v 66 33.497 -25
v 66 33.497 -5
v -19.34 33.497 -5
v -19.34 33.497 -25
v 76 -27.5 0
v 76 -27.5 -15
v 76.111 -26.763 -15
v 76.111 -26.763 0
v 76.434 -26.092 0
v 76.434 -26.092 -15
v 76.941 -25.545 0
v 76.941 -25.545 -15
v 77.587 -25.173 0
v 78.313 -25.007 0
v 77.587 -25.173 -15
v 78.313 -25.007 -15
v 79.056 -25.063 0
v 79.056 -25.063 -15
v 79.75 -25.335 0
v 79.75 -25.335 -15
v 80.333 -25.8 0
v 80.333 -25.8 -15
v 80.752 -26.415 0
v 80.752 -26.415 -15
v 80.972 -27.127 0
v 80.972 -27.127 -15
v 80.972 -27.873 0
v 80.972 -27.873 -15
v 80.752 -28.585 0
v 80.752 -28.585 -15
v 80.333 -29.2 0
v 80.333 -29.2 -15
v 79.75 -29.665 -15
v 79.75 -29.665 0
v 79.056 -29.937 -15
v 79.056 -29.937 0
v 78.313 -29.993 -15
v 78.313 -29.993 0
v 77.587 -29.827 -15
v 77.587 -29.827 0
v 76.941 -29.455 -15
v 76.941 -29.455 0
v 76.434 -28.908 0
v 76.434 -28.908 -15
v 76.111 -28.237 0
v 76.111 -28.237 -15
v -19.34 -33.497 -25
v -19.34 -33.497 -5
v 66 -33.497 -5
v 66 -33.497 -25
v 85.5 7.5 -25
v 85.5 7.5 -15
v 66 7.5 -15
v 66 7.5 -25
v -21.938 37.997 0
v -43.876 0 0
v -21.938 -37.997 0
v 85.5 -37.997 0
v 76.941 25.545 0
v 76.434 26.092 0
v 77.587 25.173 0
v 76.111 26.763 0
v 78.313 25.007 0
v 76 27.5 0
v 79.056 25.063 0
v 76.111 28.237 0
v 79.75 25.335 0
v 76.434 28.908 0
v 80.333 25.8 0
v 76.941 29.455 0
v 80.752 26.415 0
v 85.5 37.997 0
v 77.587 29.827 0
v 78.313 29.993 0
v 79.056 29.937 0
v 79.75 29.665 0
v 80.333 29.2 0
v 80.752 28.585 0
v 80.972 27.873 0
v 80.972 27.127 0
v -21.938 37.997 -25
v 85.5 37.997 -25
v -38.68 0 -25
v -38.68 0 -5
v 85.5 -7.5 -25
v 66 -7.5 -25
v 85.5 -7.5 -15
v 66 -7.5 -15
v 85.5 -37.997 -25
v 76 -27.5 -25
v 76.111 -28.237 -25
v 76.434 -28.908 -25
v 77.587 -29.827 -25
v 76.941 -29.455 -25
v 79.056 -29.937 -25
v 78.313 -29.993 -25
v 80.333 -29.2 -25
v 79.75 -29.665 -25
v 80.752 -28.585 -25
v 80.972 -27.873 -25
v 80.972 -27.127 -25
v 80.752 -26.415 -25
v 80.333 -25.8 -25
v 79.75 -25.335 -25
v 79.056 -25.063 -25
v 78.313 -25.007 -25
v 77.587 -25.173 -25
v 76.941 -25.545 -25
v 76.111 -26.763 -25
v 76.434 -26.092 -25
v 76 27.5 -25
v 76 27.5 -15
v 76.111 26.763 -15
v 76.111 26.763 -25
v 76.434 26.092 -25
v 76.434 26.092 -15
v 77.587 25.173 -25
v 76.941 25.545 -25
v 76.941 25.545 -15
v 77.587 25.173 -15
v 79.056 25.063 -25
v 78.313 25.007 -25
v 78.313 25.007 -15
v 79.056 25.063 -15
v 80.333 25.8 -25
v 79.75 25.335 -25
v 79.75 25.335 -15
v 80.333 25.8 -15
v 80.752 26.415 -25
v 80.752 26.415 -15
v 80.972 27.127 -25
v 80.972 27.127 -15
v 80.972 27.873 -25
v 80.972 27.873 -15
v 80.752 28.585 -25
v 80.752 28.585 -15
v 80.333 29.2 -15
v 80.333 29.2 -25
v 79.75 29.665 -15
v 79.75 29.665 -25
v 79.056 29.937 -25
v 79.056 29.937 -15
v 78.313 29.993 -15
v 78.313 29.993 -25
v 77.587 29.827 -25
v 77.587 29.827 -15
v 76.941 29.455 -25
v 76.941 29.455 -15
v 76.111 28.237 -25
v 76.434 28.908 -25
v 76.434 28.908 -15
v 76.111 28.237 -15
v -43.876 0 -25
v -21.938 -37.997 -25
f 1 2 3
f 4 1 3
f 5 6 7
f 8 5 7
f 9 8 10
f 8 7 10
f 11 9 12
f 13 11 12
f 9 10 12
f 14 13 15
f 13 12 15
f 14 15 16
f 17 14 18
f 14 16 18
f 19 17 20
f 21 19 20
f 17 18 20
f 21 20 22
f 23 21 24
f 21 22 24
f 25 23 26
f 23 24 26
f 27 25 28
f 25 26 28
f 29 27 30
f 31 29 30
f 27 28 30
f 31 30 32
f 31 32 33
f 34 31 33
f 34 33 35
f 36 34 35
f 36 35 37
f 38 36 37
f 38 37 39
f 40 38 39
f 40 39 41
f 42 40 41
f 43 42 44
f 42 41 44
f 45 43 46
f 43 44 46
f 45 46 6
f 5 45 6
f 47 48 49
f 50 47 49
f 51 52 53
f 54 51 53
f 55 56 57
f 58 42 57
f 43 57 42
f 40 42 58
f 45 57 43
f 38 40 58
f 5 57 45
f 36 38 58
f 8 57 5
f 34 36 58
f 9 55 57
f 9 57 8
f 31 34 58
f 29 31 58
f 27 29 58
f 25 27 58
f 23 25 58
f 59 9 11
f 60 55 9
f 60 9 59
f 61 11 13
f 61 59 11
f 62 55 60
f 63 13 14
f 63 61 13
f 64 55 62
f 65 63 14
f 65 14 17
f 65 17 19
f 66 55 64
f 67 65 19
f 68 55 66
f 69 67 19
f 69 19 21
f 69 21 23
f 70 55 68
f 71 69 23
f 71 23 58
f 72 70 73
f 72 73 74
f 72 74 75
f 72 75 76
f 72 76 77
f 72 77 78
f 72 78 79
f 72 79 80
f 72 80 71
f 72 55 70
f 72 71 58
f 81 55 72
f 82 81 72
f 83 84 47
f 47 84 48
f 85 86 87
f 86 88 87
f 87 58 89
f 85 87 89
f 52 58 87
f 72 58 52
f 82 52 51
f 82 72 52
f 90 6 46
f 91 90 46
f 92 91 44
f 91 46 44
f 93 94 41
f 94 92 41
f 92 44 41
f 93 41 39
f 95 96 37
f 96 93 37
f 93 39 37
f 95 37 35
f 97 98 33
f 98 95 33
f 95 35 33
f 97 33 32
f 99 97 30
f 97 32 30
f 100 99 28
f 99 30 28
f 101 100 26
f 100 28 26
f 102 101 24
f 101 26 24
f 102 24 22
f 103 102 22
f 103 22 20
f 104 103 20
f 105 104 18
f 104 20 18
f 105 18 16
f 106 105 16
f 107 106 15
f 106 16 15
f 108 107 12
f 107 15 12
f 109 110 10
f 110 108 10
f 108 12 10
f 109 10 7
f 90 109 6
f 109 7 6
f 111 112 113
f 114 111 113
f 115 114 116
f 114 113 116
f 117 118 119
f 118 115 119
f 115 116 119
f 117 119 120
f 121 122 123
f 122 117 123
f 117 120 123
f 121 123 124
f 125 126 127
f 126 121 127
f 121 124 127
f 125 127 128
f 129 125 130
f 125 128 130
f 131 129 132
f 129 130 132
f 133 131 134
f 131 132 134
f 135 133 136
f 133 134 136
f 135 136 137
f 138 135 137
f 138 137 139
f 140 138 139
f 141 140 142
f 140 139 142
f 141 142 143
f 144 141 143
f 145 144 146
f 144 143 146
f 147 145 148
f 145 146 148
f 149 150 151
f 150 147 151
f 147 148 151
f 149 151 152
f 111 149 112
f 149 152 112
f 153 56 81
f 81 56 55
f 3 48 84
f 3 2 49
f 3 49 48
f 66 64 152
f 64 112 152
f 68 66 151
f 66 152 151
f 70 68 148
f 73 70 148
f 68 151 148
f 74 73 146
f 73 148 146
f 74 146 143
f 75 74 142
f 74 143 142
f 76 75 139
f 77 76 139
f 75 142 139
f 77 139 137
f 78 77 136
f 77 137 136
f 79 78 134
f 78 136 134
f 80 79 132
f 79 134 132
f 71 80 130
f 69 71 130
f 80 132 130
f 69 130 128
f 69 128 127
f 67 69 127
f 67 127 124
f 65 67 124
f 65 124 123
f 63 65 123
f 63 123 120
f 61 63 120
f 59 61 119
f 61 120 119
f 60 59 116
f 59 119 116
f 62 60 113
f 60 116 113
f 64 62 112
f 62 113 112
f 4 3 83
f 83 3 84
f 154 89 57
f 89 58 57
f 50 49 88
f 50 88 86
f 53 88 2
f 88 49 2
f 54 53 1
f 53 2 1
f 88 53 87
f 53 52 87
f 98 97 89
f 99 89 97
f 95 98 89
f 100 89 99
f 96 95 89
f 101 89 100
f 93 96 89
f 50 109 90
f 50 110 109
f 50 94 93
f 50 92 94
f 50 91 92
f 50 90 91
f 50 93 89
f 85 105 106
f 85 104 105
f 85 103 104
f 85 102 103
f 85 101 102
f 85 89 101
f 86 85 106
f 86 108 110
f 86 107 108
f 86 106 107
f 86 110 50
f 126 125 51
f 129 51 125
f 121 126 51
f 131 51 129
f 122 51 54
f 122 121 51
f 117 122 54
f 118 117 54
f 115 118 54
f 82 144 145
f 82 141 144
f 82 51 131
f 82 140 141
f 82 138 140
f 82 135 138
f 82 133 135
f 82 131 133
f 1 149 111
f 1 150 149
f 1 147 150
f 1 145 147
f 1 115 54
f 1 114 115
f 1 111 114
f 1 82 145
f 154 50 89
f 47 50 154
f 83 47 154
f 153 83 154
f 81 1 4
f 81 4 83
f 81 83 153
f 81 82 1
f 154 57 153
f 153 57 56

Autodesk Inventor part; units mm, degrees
ref_plane "YZ Plane" through (0, 0, 0) normal (1, 0, 0) x (0, 1, 0)
ref_plane "XZ Plane" through (0, 0, 0) normal (0, 1, 0) x (-1, 0, 0)
ref_plane "XY Plane" through (0, 0, 0) normal (0, 0, 1) x (1, 0, 0)
sketch "Sketch1" plane through (0, 0, 0) normal (0, 0, 1) x (1, 0, 0)
  line L0 (-56, 0) -> (-28, 48.4974)
  line L1 (-28, 48.4974) -> (28, 48.4974)
  line L2 (28, 48.4974) -> (56, 0)
  line L3 (56, 0) -> (28, -48.4974)
  line L4 (28, -48.4974) -> (-28, -48.4974)
  line L5 (-28, -48.4974) -> (-56, 0)
  line L6 (28, 48.4974) -> (86, 48.4974)
  line L7 (86, 48.4974) -> (86, -48.4974)
  line L8 (86, -48.4974) -> (28, -48.4974)
  point P0 (0, 0)
  point P1 (0, 0)
  dimension "d0" = 112
  dimension "d1" = 30
extrude "Extrusion1" add sketch "Sketch1" along normal blind 5
sketch "Sketch2" plane through (0, 0, 0) normal (0, 0, -1) x (-1, 0, 0)
  line L0 (-86, 48.4974) -> (28, 48.4974) projected
  line L1 (28, 48.4974) -> (56, 0) projected
  line L2 (56, 0) -> (28, -48.4974) projected
  line L3 (28, -48.4974) -> (-86, -48.4974) projected
  line L4 (-86, 33.4974) -> (19.3397, 33.4974)
  line L5 (19.3397, 33.4974) -> (38.6795, 0)
  line L6 (38.6795, 0) -> (19.3397, -33.4974)
  line L7 (19.3397, -33.4974) -> (-86, -33.4974)
  line L8 (-86, -48.4974) -> (-86, 48.4974) projected
  line L9 (-86, -48.4974) -> (-86, 48.4974) projected
  line L10 (-86, 48.4974) -> (-66, 48.4974)
  line L11 (-66, 48.4974) -> (-66, -48.4974)
  line L12 (-66, -48.4974) -> (-86, -48.4974)
  line L13 (-86, -48.4974) -> (-86, 48.4974)
  line L14 (-86, 48.4974) -> (-86, 33.4974)
  line L15 (-86, -33.4974) -> (-86, -48.4974)
  point P0 (0, 0)
  dimension "d4" = 15
  dimension "d5" = 20
extrude "Extrusion2" add sketch "Sketch2" along normal blind 15 contours L0 L11 L4 L8 | L0 L1 L2 L3 L11 L7 L6 L5 L4 | L4 L11 L7 L8 | L7 L11 L3 L8
sketch "Sketch3" plane through (0, 0, 5) normal (0, 0, 1) x (1, 0, 0)
  line L0 (86, 48.4974) -> (-28, 48.4974) projected
  line L1 (-28, 48.4974) -> (-56, 0) projected
  line L2 (-56, 0) -> (-28, -48.4974) projected
  line L3 (-28, -48.4974) -> (86, -48.4974) projected
  line L4 (86, -48.4974) -> (86, 48.4974) projected
  line L5 (76, -38.4974) -> (-22.2265, -38.4974)
  line L6 (-22.2265, -38.4974) -> (-44.453, 0)
  line L7 (-44.453, 0) -> (-22.2265, 38.4974)
  line L8 (-22.2265, 38.4974) -> (76, 38.4974)
  line L9 (76, 38.4974) -> (76, -38.4974)
  point P0 (0, 0)
  dimension "d8" = 10
extrude "Extrusion3" cut sketch "Sketch3" against normal through all
sketch "Sketch4" plane through (0, 0, 0) normal (0, 0, -1) x (-1, 0, 0)
  line L0 (-76, -38.4974) -> (-86, -38.4974)
  line L1 (-86, -38.4974) -> (-86, 38.4974)
  line L2 (-86, 38.4974) -> (-76, 38.4974)
  line L3 (-76, 38.4974) -> (-76, -38.4974)
  point P0 (0, 0)
  dimension "d11" = 10
extrude "Extrusion4" add sketch "Sketch4" along normal blind 15 and the other way blind 5
sketch "Sketch5" plane through (0, 0, 0) normal (0, 0, -1) x (-1, 0, 0)
  line L0 (-66, 33.4974) -> (-66, -33.4974) projected
  line L1 (-66, -33.4974) -> (19.3397, -33.4974) projected
  line L2 (19.3397, -33.4974) -> (38.6795, 0) projected
  line L3 (38.6795, 0) -> (19.3397, 33.4974) projected
  line L4 (19.3397, 33.4974) -> (-66, 33.4974) projected
  point P0 (0, 0)
extrude "Extrusion5" add sketch "Sketch5" along normal blind 5
sketch "Sketch7" plane through (0, 0, 5) normal (0, 0, 1) x (1, 0, 0)
  line L0 (86, 38.4974) -> (-22.2265, 38.4974) projected
  line L1 (-22.2265, 38.4974) -> (-44.453, 0) projected
  line L2 (-44.453, 0) -> (-22.2265, -38.4974) projected
  line L3 (-22.2265, -38.4974) -> (86, -38.4974) projected
  line L4 (86, -38.4974) -> (86, 38.4974) projected
  point P0 (0, 0)
extrude "Extrusion6" cut sketch "Sketch7" against normal blind 5
sketch "Sketch8" plane through (66, -33.4974, -15) normal (-1, 0, 0) x (0, 0, 1)
  line L0 (10, 0) -> (10, 66.9948) projected
  line L1 (0, 66.9948) -> (10, 66.9948) projected
  line L2 (0, 0) -> (0, 66.9948) projected
  line L3 (10, 0) -> (0, 0) projected
  line L4 (0, 71.9948) -> (0, -5) projected
  line L5 (0, 25.9974) -> (10, 25.9974)
  line L6 (10, 25.9974) -> (10, 40.9974)
  line L7 (10, 40.9974) -> (0, 40.9974)
  line L8 (0, 40.9974) -> (0, 25.9974)
  point P0 (15, 33.4974)
  point P1 (10, 33.4974)
  dimension "d20" = 15
extrude "Extrusion7" cut sketch "Sketch8" against normal through all contours L5 L2 L7 L0
sketch "Sketch9" plane through (0, 0, -15) normal (0, 0, -1) x (-1, 0, 0)
  line L0 (-86, -7.5) -> (-86, 7.5) construction
  line L1 (-66, -7.5) -> (-86, -7.5) construction
  line L2 (-78.5, -27.5) -> (-78.5, 27.5) construction
  circle A0 centre (-78.5, -27.5) radius 2.5
  circle A1 centre (-78.5, 27.5) radius 2.5
  point P0 (0, 0)
  point P1 (-78.5, 0)
  point P2 (-86, 0)
  dimension "d23" = 55
  dimension "d24" = 5
  dimension "d25" = 5
  dimension "d32" = 7.5
extrude "Extrusion8" cut sketch "Sketch9" against normal through all
sketch "Sketch10" plane through (0, 0, 0) normal (0, 0, 1) x (1, 0, 0)
  circle A0 centre (78.5, -27.5) radius 2.5 projected
  circle A1 centre (78.5, 27.5) radius 2.5 projected
  line L0 (-22.2265, 38.4974) -> (86, 38.4974) projected
  line L1 (-44.453, 0) -> (-22.2265, 38.4974) projected
  line L2 (-22.2265, -38.4974) -> (-44.453, 0) projected
  line L3 (86, -38.4974) -> (-22.2265, -38.4974) projected
  line L4 (86, 38.4974) -> (86, -38.4974) projected
  line L5 (-43.8756, 0) -> (-21.9378, 37.9974)
  line L6 (-21.9378, 37.9974) -> (85.5, 37.9974)
  line L7 (85.5, 37.9974) -> (85.5, -37.9974)
  line L8 (85.5, -37.9974) -> (-21.9378, -37.9974)
  line L9 (-21.9378, -37.9974) -> (-43.8756, 0)
  point P0 (0, 0)
  dimension "d29" = 0.5
extrude "Extrusion9" cut sketch "Sketch10" against normal through all contours L0 L4 L3 L2 L1
sketch "Sketch12" plane through (0, 0, -15) normal (0, 0, -1) x (-1, 0, 0)
  line L0 (-85.5, 37.9974) -> (-85.5, 7.5) projected
  line L1 (-85.5, 7.5) -> (-66, 7.5) projected
  line L2 (-66, 7.5) -> (-66, 33.4974) projected
  line L3 (-66, 33.4974) -> (19.3397, 33.4974) projected
  line L4 (19.3397, 33.4974) -> (38.6795, 0) projected
  line L5 (38.6795, 0) -> (19.3397, -33.4974) projected
  line L6 (19.3397, -33.4974) -> (-66, -33.4974) projected
  line L7 (-66, -33.4974) -> (-66, -7.5) projected
  line L8 (-66, -7.5) -> (-85.5, -7.5) projected
  line L9 (-85.5, -7.5) -> (-85.5, -37.9974) projected
  line L10 (-85.5, -37.9974) -> (21.9378, -37.9974) projected
  line L11 (21.9378, -37.9974) -> (43.8756, 0) projected
  line L12 (43.8756, 0) -> (21.9378, 37.9974) projected
  line L13 (21.9378, 37.9974) -> (-85.5, 37.9974) projected
  circle A0 centre (-78.5, -27.5) radius 2.5 projected
  circle A1 centre (-78.5, 27.5) radius 2.5 projected
  point P0 (0, 0)
extrude "Extrusion11" add sketch "Sketch12" along normal blind 10
sketch "Sketch13" plane through (85.5, -37.9974, 0) normal (1, 0, 0) x (0, 0, -1)
  line L0 (5, 45.4974) -> (5, 30.4974) projected
  line L1 (25, 45.4974) -> (5, 45.4974) projected
  line L2 (5, 45.4974) -> (15, 45.4974)
  line L3 (15, 45.4974) -> (15, 30.4974)
  line L4 (15, 30.4974) -> (5, 30.4974)
  line L5 (5, 30.4974) -> (5, 45.4974)
  line L6 (5, 30.4974) -> (25, 30.4974) projected
  point P0 (0, 37.9974)
  dimension "d39" = 10
extrude "Extrusion12" add sketch "Sketch13" against normal blind 19.5
properties part number "TARM05" material "ABS Plastic"
